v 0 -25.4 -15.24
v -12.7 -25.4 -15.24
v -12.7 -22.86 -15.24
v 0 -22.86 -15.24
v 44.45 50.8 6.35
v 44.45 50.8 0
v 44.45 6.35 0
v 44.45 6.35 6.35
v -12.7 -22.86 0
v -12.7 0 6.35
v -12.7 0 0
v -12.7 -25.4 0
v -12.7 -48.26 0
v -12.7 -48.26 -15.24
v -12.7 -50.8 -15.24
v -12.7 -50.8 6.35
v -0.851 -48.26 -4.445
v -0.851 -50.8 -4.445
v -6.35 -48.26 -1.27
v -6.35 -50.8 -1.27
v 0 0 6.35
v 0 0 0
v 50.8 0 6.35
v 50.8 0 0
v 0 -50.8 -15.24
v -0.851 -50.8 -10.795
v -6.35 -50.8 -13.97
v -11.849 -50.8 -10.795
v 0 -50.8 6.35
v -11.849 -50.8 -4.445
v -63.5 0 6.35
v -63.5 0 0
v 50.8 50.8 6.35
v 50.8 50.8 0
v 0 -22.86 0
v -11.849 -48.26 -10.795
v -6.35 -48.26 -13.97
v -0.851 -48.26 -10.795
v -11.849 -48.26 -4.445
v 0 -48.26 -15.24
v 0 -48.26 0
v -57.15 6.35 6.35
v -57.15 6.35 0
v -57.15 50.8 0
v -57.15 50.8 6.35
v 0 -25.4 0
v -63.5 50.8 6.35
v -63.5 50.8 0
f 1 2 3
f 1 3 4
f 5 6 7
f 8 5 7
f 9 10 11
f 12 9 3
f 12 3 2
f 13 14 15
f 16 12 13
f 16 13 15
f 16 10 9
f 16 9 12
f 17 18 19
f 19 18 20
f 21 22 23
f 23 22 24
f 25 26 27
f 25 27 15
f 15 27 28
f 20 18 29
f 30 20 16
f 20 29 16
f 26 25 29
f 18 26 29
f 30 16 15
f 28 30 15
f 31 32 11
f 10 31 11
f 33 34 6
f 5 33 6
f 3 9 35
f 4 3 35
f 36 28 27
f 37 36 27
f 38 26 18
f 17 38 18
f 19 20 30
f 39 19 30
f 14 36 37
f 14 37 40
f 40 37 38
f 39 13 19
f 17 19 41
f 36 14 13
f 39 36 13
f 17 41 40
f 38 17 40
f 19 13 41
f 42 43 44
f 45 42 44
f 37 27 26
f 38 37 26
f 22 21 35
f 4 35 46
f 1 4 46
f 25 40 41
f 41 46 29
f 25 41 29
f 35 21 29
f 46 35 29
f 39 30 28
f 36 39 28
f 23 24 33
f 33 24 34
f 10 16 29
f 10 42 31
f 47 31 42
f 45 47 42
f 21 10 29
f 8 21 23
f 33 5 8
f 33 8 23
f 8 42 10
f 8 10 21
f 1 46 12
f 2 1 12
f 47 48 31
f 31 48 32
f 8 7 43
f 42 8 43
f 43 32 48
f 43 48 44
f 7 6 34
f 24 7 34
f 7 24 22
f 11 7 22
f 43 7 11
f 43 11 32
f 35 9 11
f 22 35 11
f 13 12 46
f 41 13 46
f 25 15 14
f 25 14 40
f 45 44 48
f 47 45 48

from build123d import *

# Parameters (mm, degrees)
F1_DEPTH = 6.35
F2_W     = 6.35
F2_H     = 2.54
F3_DEPTH = 15.24
F5_DEPTH = 2.54


with BuildPart() as f1:
    # F0 (on Top) → F1 (new body)
    with BuildSketch(Plane.XY):
        Polygon((-12.7, -50.8), (-6.35, -50.8), (0, -50.8), (0, 0), (50.8, 0), (50.8, 50.8), (44.45, 50.8), (44.45, 6.35), (-57.15, 6.35), (-57.15, 50.8), (-63.5, 50.8), (-63.5, 0), (-12.7, 0), align=None)
    extrude(amount=F1_DEPTH)

    # F2 (on face) → F3 (join)
    with BuildSketch(Plane(origin=(0, 0, 0), x_dir=(1, 0, 0), z_dir=(0, 0, -1))):
        Polygon((0, 25.4), (-6.35, 25.4), (-12.7, 25.4), (-12.7, 22.86), (0, 22.86), align=None)
        with Locations((-9.525, 49.53)):
            Rectangle(F2_W, F2_H)
        with Locations((-3.175, 49.53)):
            Rectangle(F2_W, F2_H)
    extrude(amount=F3_DEPTH)

    # F4 (on face) → F5 (cut, through all)
    with BuildSketch(Plane.XZ.offset(50.8)):
        Polygon((-11.8491, -10.794907), (-6.35, -13.969814), (-0.8509, -10.794907), (-0.8509, -4.445093), (-6.35, -1.270186), (-11.8491, -4.445093), align=None)
    extrude(amount=-F5_DEPTH, mode=Mode.SUBTRACT)


solid = f1.part
